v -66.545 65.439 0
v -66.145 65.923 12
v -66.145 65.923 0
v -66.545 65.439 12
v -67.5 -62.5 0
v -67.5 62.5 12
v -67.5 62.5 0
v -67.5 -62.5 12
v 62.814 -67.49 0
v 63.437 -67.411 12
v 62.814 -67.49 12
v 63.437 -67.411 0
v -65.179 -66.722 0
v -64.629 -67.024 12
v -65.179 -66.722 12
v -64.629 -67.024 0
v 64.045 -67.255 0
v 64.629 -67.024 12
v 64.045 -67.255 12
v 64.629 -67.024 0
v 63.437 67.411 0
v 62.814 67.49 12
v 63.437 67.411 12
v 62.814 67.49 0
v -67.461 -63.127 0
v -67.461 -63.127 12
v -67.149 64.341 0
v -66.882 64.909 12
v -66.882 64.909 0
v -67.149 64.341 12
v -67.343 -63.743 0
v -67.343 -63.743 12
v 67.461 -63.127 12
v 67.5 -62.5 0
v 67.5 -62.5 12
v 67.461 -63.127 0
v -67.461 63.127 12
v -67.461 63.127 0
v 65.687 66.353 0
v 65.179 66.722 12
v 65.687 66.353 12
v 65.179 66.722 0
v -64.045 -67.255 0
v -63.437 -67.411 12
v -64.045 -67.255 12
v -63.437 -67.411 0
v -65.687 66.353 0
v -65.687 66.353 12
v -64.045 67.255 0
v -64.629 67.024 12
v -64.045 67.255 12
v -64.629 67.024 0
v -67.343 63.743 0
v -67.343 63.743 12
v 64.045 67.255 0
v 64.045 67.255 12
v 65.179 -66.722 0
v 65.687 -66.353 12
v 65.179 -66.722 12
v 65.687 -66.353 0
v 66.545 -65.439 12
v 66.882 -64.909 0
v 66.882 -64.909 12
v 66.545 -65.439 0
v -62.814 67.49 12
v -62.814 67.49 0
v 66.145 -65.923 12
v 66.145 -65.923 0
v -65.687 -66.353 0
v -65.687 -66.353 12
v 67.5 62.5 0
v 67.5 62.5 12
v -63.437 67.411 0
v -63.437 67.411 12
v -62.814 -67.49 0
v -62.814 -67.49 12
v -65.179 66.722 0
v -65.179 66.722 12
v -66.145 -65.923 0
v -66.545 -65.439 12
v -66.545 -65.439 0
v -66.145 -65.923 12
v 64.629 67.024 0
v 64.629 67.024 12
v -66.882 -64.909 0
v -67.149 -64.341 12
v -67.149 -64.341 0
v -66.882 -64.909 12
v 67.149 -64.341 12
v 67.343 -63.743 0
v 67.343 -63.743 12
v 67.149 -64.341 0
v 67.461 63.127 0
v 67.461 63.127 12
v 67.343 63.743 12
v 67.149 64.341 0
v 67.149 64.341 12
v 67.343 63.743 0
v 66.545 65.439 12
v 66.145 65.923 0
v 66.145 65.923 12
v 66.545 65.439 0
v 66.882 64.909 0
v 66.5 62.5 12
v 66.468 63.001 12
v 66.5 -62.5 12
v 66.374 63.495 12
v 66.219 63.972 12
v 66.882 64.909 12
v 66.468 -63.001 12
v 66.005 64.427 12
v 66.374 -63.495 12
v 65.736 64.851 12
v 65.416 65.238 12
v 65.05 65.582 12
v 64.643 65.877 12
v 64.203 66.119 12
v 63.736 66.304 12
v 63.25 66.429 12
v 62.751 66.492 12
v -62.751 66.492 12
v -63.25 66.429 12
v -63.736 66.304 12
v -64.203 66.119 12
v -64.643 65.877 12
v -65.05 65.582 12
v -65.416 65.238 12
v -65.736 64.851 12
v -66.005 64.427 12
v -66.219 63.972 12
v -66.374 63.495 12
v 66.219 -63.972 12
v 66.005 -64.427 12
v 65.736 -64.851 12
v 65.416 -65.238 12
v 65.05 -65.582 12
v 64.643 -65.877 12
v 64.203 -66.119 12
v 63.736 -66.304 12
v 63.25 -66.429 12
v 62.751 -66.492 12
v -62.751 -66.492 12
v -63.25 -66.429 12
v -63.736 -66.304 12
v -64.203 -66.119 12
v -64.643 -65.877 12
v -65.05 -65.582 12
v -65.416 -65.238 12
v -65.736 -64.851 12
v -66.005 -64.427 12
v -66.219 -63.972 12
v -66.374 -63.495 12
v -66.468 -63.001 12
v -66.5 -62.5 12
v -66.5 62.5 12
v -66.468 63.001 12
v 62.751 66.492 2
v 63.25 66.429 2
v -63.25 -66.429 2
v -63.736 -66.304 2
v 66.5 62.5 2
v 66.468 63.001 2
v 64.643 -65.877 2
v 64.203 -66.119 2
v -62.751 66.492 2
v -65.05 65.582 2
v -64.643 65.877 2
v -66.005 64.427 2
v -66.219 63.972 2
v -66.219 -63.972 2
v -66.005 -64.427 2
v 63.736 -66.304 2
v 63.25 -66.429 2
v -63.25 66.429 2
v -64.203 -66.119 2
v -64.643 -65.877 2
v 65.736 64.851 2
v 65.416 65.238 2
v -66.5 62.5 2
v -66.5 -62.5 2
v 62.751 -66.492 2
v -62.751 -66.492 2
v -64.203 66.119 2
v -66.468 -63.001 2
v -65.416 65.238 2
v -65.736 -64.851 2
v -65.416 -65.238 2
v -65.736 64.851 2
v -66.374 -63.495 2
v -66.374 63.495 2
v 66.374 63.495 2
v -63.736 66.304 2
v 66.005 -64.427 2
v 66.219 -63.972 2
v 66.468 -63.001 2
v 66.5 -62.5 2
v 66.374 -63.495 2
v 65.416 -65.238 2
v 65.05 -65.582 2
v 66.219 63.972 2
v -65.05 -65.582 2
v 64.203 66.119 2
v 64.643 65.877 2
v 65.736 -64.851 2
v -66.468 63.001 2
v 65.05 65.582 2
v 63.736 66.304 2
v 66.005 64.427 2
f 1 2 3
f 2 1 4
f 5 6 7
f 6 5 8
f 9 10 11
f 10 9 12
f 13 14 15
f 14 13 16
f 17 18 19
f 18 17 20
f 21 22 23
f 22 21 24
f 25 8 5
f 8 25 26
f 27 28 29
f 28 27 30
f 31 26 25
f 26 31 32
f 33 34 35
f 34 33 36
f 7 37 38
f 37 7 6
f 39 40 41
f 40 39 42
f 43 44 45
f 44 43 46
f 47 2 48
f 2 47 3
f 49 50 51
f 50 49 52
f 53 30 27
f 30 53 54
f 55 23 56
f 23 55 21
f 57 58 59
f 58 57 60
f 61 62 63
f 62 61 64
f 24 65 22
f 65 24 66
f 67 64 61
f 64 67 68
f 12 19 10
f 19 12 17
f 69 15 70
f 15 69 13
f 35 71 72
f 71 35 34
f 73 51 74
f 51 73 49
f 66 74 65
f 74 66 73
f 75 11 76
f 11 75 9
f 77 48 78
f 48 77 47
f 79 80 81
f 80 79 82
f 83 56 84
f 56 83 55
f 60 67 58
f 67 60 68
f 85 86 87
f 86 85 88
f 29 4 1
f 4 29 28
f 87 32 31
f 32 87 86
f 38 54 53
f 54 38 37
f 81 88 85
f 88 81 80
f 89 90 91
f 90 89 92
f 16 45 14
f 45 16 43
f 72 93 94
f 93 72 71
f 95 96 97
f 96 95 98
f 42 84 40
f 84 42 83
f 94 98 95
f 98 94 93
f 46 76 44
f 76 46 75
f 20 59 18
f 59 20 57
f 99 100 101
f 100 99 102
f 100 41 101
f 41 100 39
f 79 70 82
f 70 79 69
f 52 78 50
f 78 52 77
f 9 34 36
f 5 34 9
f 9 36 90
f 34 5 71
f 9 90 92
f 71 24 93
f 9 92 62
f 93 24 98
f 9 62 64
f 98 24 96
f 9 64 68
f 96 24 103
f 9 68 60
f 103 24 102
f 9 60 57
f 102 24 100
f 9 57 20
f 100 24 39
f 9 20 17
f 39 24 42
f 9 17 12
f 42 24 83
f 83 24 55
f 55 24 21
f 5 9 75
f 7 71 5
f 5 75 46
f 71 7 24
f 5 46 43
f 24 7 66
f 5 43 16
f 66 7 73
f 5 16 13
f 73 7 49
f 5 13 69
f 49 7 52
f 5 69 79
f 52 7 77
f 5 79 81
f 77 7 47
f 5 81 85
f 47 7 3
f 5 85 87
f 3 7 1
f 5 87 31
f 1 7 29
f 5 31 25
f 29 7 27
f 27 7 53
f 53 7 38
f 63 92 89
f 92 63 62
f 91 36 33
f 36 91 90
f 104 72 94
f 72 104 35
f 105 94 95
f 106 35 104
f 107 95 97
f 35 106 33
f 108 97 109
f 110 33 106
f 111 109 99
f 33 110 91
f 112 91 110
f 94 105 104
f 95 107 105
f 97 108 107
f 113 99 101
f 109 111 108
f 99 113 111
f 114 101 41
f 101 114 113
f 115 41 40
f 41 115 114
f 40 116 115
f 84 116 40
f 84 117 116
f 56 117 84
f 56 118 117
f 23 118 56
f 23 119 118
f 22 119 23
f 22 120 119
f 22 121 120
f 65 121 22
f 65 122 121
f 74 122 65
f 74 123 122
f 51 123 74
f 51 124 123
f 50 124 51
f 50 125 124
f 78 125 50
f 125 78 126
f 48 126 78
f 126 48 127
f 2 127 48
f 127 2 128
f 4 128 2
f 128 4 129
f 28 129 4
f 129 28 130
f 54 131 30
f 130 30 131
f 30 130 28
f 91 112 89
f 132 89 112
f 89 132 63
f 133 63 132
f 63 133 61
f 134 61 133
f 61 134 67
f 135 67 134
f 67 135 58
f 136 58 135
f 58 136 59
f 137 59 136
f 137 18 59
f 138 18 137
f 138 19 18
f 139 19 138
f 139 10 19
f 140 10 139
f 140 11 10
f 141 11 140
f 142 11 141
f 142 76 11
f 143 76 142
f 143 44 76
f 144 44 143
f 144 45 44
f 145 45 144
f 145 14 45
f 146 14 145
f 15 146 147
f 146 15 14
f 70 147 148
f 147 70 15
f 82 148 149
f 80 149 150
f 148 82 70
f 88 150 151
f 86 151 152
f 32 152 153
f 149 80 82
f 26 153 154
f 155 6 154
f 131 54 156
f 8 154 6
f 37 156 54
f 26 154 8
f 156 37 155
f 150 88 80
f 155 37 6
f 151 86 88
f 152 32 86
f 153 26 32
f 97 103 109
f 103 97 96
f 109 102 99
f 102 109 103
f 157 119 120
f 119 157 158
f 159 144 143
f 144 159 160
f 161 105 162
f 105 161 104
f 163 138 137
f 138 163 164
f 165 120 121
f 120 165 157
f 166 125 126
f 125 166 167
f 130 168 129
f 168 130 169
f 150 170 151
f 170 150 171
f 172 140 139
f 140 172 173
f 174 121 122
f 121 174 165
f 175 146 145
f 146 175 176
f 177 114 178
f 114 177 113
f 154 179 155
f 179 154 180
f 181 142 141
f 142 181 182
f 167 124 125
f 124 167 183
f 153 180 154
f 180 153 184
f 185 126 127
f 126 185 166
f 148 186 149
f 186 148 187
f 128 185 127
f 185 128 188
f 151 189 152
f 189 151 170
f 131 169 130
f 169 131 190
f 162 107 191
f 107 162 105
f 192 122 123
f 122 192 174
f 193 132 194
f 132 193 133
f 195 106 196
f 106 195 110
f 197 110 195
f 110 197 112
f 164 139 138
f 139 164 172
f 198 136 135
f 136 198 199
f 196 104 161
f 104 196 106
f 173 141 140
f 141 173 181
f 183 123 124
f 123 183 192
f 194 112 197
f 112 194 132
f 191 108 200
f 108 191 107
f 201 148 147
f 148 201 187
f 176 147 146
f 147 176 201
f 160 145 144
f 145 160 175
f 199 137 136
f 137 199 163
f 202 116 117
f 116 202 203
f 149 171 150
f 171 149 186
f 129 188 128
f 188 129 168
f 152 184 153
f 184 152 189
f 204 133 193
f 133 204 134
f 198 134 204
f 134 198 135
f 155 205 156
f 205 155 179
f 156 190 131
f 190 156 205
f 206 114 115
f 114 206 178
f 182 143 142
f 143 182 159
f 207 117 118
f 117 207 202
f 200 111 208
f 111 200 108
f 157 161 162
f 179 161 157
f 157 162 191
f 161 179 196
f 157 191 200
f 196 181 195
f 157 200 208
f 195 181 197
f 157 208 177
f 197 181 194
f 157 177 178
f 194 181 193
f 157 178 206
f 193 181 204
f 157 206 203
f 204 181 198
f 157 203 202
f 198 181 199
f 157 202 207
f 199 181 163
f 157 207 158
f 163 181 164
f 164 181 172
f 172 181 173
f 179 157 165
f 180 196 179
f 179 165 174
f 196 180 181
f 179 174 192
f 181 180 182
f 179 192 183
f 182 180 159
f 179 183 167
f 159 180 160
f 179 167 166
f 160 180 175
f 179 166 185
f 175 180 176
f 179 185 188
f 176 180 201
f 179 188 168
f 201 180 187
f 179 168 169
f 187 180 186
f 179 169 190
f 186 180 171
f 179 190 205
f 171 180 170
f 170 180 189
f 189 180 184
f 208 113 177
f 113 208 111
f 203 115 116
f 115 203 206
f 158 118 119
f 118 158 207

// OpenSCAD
$fn = 50;


difference() {
	union() {
		hull() {
			translate(v = [-62.5000000000, 62.5000000000, 0]) {
				cylinder(h = 12, r = 5);
			}
			translate(v = [62.5000000000, 62.5000000000, 0]) {
				cylinder(h = 12, r = 5);
			}
			translate(v = [-62.5000000000, -62.5000000000, 0]) {
				cylinder(h = 12, r = 5);
			}
			translate(v = [62.5000000000, -62.5000000000, 0]) {
				cylinder(h = 12, r = 5);
			}
		}
	}
	union() {
		translate(v = [0, 0, 2]) {
			hull() {
				translate(v = [-62.5000000000, 62.5000000000, 0]) {
					cylinder(h = 10, r = 4);
				}
				translate(v = [62.5000000000, 62.5000000000, 0]) {
					cylinder(h = 10, r = 4);
				}
				translate(v = [-62.5000000000, -62.5000000000, 0]) {
					cylinder(h = 10, r = 4);
				}
				translate(v = [62.5000000000, -62.5000000000, 0]) {
					cylinder(h = 10, r = 4);
				}
			}
		}
	}
}
